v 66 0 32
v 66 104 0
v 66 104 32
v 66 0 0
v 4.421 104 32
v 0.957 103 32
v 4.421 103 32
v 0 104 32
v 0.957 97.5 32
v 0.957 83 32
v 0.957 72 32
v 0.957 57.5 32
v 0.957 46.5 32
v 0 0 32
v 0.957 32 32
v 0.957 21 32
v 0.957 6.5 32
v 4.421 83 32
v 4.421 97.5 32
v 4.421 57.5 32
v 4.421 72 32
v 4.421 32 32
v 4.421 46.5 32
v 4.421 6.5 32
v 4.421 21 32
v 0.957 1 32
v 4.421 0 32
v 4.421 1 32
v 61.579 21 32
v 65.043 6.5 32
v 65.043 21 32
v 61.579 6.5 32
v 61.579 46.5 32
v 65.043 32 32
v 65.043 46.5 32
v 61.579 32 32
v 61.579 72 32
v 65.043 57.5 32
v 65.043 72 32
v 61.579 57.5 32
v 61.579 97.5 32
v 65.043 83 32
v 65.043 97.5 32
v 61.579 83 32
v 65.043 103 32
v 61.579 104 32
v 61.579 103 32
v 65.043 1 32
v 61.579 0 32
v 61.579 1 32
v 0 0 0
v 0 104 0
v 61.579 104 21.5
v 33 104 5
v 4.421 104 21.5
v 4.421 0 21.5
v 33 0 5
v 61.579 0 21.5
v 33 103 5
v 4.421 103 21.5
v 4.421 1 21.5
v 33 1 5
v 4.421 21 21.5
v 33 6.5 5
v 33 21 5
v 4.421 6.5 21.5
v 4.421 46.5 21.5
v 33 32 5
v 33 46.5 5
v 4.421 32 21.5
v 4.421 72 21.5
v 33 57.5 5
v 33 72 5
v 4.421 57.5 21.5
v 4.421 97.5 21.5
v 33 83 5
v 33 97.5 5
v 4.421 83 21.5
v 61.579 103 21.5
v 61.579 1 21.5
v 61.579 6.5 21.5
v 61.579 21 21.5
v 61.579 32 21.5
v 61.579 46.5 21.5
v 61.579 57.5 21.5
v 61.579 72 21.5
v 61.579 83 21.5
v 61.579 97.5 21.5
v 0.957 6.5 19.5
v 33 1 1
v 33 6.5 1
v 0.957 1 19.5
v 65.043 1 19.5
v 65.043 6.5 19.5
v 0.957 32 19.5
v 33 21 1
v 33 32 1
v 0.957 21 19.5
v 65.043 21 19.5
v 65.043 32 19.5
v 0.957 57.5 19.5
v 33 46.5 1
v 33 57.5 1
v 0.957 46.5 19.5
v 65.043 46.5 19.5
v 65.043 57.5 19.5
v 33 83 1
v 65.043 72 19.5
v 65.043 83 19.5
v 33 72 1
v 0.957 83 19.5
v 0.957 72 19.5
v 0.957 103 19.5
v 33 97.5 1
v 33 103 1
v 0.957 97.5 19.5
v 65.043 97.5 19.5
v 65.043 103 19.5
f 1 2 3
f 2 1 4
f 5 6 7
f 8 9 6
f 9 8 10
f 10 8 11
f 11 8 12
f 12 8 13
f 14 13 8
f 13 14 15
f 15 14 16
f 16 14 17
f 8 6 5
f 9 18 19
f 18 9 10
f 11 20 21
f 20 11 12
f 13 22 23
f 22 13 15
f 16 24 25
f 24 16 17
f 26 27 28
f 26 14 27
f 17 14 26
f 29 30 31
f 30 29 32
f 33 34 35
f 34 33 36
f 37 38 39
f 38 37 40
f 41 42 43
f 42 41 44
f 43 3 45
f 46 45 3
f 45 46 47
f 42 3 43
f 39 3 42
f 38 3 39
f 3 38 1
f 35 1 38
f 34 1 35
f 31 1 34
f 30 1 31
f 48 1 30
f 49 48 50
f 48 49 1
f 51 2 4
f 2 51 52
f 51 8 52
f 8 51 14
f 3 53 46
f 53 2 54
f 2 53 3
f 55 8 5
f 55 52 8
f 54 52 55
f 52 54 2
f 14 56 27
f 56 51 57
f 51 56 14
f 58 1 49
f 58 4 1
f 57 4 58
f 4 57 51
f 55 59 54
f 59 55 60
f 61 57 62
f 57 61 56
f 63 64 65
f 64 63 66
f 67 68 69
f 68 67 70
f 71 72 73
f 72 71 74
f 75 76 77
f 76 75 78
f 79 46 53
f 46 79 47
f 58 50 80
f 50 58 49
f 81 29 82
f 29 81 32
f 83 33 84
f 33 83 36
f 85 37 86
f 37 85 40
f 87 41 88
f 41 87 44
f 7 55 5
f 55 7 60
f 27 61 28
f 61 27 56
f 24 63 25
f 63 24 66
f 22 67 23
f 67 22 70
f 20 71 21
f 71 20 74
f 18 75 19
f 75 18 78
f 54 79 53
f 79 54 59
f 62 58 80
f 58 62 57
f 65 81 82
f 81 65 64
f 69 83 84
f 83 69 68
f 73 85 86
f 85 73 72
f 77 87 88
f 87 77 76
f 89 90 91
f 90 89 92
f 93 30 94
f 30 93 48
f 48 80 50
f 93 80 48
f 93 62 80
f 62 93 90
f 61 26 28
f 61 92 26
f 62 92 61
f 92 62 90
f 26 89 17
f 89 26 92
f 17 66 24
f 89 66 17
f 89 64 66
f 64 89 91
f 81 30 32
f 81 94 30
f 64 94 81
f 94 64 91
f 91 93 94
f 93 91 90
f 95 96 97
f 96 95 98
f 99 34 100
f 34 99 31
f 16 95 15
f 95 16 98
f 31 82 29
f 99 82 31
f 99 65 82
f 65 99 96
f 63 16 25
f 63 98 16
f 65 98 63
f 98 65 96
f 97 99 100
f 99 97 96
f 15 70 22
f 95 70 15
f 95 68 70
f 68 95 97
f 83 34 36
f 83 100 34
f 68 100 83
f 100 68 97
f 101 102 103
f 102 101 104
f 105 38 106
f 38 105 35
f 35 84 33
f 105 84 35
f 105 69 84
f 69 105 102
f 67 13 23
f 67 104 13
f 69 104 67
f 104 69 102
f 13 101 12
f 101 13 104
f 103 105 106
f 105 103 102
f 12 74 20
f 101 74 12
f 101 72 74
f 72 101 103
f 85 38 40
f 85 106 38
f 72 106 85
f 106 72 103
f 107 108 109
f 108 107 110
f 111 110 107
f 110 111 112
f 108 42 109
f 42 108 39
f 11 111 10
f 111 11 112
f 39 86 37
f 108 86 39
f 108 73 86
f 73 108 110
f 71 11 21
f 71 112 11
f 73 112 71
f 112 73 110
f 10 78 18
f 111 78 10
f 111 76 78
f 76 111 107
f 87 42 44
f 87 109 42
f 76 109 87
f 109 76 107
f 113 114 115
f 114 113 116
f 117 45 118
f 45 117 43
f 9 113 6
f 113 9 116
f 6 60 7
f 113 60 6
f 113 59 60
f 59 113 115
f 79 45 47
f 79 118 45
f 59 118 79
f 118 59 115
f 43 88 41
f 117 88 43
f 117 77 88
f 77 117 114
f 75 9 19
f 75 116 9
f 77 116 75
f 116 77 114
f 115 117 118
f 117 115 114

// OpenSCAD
$fn=200;
THICK = 1;

TILE_L = 20;
TILE_COUNT = 8;

BOX_W = 64;
BOX_L = 102;
BOX_H = 32;

difference() {
    cube(size = [
        BOX_W + (THICK * 2),
        BOX_L + (THICK * 2), 
        BOX_H]);

    translate([33, -5, 38])
        rotate([0, 90, 90]) 
            cylinder(h = 200, r = 33, $fn=6);


    tile_slot(1);
    tile_slot(1 + TILE_L);

    tile_slot(6.5 + TILE_L);
    tile_slot(6.5 + (TILE_L * 2));

    tile_slot(12 + (TILE_L * 2));
    tile_slot(12 + (TILE_L * 3));

    tile_slot(17.5 + (TILE_L * 3));
    tile_slot(17.5 + (TILE_L * 4));
}

module tile_slot(y) {
    translate([33, y, 38])
        rotate([0, 90, 90]) 
            cylinder(h = 5.5, r = 37, $fn=6);
}
